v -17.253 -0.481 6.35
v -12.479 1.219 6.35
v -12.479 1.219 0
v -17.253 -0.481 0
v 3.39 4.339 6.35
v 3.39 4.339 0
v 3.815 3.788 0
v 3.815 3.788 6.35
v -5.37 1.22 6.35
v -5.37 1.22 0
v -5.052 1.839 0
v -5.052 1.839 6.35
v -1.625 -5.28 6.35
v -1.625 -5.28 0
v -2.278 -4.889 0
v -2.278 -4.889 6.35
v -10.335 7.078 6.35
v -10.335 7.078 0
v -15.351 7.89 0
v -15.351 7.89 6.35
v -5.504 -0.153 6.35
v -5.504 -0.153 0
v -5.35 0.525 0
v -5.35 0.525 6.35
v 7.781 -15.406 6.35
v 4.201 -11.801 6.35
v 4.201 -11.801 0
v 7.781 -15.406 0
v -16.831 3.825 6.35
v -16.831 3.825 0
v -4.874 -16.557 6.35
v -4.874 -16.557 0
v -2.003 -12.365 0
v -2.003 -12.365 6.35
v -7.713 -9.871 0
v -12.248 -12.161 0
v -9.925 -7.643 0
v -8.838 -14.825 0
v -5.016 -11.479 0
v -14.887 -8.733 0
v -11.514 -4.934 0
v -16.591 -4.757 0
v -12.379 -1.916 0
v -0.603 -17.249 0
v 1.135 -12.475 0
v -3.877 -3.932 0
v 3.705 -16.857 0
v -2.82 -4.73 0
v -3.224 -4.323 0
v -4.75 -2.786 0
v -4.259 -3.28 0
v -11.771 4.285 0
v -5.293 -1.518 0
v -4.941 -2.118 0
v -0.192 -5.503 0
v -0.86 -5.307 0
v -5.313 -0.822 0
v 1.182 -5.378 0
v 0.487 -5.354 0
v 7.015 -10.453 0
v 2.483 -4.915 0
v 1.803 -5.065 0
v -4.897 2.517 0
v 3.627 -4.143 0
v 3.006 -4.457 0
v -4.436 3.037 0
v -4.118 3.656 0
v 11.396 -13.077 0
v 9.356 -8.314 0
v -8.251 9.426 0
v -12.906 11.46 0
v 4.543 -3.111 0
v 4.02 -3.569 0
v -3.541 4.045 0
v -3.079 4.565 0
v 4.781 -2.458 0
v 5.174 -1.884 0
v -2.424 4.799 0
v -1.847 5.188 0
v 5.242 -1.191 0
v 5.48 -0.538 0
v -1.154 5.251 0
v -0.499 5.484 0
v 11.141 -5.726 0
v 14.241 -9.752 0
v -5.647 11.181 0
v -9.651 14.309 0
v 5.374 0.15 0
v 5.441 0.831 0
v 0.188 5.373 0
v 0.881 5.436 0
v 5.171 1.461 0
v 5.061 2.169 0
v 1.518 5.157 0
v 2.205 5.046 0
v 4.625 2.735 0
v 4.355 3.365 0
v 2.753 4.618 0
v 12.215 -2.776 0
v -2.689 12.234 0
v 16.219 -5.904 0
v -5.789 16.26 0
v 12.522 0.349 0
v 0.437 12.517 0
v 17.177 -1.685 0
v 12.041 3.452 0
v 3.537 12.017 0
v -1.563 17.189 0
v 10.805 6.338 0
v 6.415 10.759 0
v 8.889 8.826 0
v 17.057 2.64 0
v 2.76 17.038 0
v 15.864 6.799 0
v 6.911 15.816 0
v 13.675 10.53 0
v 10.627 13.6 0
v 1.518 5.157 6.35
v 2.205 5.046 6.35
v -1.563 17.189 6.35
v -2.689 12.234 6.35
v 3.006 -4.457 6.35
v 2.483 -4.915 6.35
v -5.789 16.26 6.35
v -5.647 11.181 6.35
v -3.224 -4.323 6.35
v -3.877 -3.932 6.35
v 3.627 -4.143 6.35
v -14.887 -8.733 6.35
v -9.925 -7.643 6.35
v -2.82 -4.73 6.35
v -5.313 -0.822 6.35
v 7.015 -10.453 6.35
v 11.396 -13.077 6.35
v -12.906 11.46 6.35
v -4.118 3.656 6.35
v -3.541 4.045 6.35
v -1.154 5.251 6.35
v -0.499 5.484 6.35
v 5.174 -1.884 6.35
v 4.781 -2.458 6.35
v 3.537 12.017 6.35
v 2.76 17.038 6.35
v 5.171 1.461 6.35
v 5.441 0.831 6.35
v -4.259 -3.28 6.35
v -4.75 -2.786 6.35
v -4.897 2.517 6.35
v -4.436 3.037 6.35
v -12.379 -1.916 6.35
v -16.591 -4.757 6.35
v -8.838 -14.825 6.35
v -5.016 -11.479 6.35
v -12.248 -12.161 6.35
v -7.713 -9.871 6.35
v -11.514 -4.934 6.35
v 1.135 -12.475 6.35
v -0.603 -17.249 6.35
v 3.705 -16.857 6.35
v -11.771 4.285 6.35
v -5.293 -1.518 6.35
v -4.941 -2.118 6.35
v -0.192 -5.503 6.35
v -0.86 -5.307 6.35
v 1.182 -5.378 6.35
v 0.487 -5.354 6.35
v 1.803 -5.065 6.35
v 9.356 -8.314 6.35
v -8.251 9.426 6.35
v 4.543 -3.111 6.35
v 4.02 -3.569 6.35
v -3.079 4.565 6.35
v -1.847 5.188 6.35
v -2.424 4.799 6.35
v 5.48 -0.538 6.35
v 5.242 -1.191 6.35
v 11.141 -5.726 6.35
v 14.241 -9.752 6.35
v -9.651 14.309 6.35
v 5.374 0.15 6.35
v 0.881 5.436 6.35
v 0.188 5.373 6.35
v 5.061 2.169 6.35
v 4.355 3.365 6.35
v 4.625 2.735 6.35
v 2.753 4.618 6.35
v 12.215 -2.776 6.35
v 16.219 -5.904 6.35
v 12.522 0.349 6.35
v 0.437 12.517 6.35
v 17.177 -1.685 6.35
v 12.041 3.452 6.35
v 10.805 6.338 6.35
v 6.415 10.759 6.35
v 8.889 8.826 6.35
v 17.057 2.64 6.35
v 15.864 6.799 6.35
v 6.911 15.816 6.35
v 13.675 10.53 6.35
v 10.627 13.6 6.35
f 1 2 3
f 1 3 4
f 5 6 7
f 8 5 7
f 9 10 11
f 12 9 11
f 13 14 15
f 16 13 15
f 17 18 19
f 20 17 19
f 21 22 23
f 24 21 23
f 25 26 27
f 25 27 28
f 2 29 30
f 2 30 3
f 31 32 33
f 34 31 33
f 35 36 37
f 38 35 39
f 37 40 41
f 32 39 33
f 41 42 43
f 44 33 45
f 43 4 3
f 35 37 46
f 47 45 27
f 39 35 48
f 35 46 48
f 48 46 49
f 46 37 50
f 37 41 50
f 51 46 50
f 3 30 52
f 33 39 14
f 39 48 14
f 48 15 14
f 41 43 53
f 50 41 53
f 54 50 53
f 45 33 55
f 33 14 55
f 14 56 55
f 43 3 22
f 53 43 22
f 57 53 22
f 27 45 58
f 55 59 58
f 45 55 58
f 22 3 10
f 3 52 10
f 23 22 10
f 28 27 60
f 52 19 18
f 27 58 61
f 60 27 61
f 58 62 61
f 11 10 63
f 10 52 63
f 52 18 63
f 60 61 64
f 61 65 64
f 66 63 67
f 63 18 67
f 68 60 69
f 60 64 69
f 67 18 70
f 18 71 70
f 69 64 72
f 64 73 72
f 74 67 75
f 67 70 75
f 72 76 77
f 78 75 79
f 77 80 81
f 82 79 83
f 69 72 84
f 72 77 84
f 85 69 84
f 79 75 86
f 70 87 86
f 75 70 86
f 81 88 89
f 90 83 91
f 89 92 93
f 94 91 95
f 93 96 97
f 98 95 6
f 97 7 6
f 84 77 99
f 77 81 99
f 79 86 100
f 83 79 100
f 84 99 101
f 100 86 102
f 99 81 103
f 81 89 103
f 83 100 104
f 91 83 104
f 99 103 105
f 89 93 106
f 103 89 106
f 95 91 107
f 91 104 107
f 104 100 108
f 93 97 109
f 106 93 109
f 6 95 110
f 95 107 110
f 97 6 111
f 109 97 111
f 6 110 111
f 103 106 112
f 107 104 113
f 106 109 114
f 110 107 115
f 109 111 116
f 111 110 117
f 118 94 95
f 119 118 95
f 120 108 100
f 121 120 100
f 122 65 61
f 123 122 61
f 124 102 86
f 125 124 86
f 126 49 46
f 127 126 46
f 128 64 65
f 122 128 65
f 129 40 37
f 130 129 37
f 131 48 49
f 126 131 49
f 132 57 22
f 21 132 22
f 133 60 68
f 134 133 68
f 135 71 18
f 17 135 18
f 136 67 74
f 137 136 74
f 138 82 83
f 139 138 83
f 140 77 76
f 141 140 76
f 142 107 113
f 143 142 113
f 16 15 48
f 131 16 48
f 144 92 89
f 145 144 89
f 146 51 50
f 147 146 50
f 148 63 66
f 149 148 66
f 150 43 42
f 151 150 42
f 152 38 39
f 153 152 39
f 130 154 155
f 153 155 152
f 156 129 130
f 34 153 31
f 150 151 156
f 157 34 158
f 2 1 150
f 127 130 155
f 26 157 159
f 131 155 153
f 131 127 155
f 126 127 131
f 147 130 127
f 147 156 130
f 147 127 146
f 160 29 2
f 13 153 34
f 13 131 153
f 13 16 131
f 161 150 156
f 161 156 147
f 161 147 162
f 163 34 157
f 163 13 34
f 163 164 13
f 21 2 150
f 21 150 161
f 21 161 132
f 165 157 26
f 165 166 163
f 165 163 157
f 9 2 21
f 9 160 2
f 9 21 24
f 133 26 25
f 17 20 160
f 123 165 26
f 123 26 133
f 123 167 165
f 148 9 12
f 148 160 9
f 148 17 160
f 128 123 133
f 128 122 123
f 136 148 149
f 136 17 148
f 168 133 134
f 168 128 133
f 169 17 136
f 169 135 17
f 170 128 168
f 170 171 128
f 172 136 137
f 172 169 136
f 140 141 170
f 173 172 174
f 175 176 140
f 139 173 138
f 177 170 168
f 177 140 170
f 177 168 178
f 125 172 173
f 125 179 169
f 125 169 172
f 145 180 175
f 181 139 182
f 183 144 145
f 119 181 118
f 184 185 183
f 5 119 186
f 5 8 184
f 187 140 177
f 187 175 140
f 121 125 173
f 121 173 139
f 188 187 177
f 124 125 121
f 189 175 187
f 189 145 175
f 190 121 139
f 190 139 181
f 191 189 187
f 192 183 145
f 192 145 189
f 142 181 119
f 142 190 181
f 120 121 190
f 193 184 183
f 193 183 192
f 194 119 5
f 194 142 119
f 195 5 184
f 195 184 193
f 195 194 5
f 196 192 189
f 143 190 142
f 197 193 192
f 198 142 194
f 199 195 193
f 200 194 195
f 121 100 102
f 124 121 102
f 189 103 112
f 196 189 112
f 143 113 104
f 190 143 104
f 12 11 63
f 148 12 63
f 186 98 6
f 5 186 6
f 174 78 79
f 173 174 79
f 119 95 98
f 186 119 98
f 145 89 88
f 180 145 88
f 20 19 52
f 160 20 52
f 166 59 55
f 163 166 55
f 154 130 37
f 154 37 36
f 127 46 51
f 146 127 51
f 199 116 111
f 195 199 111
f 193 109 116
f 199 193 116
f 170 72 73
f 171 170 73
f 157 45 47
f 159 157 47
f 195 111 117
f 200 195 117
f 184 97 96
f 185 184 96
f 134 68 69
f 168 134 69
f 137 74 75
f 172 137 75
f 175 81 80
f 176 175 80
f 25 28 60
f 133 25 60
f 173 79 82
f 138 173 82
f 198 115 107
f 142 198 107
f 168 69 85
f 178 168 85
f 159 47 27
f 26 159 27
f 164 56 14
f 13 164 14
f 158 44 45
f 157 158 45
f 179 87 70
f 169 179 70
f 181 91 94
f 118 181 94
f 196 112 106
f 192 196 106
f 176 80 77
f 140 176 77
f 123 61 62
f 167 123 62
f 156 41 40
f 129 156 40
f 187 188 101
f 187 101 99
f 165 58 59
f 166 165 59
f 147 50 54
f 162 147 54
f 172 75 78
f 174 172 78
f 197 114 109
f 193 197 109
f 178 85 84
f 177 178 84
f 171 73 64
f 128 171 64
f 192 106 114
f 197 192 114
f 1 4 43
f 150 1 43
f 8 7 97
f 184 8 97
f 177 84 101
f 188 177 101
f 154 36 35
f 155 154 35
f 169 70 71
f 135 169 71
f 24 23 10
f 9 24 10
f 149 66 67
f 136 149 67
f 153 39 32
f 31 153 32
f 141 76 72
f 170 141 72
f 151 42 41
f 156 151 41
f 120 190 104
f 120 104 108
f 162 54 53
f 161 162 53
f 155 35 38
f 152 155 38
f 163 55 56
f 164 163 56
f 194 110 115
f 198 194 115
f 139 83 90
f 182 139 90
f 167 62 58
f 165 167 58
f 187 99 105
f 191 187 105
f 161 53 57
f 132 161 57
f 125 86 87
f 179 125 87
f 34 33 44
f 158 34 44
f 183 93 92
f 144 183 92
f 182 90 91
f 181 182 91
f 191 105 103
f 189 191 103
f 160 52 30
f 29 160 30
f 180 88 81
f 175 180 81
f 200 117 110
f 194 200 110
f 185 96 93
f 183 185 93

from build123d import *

# Parameters (mm, degrees)
F1_DEPTH = 6.35


with BuildPart() as f1:
    # F0 (on Top) → F1 (new body)
    with BuildSketch(Plane.XY):
        Polygon((-9.9249884928, -7.6425344914), (-12.247526979, -12.1611884982), (-7.7125556882, -9.8706744851), (-7.0632786771, -7.0134863597), align=None)
        Polygon((-14.8871129928, -8.7332862962), (-9.9249884928, -7.6425344914), (-8.5855559204, -5.0365788116), (-11.5137977688, -4.9341859484), align=None)
        Polygon((-2.689317388, 12.2344310052), (-0.9016808431, 9.9129142155), (0.4368313525, 12.5170792408), (-1.5634892742, 17.1887150212), align=None)
        Polygon((2.7602902155, 17.0375239022), (0.4368313525, 12.5170792408), (1.59009399, 9.8236995246), (3.5373152954, 12.0167021489), align=None)
        Polygon((6.9106305194, 15.8158024967), (3.5373152954, 12.0167021489), (3.9854338983, 9.1211410048), (6.4146163322, 10.759480812), align=None)
        Polygon((6.5561399087, -7.4897213623), (7.0148097041, -10.4534600445), (11.3956434652, -13.0766071379), (9.3563779673, -8.3140178118), align=None)
        Polygon((4.4824223233, -8.9371220687), (4.2014921158, -11.8008980182), (7.7812835915, -15.4061042596), (7.0148097041, -10.4534600445), align=None)
        Polygon((2.136988413, -9.7217373504), (1.1347305184, -12.4750197068), (3.7054779287, -16.8572197029), (4.2014921158, -11.8008980182), align=None)
        Polygon((-16.8305841839, 3.8246383906), (-12.478542001, 1.2187310622), (-9.7063763642, 2.2057095149), (-11.770880067, 4.2848701827), align=None)
        Polygon((-15.3506715427, 7.8900764242), (-11.770880067, 4.2848701827), (-8.8528950516, 4.5502907373), (-10.3354723423, 7.0775519423), align=None)
        Polygon((-12.9062197526, 11.4597519383), (-10.3354723423, 7.0775519423), (-7.4431537842, 6.6089604578), (-8.2506488792, 9.4255250839), align=None)
        Polygon((9.1491069561, 3.9208083979), (12.0414255143, 3.4522169134), (15.8642946714, 6.7985717154), (10.8045905545, 6.3383399234), align=None)
        Polygon((9.8367363351, 1.5223386156), (12.5216534238, 0.3491784184), (17.0566247147, 2.6396924315), (12.0414255143, 3.4522169134), align=None)
        Polygon((9.9062873932, -0.9717853007), (12.2150997973, -2.7758002408), (17.1772242973, -1.685048436), (12.5216534238, 0.3491784184), align=None)
        Polygon((-5.0971896576, -8.549710766), (-7.7125556882, -9.8706744851), (-8.8383838019, -14.8249585011), (-5.0155146449, -11.4786036991), align=None)
        Polygon((-16.5912869462, -4.7566395974), (-11.5137977688, -4.9341859484), (-9.5683711098, -2.7432044935), (-12.3791527863, -1.9158043555), align=None)
        Polygon((10.6267504922, 13.600316054), (6.4146163322, 10.759480812), (6.128559691, 7.8434464811), (8.8888634336, 8.8262017251), align=None)
        Polygon((-0.3478467723, -9.9477585018), (-2.0033303707, -12.3652900273), (-0.6031565401, -17.2491340356), (1.1347305184, -12.4750197068), align=None)
        Polygon((-9.6508227097, 14.3093690922), (-8.2506488792, 9.4255250839), (-5.5657317905, 8.2523648867), (-5.6474068032, 11.1812578198), align=None)
        Polygon((9.3533899816, -3.4048483725), (11.1410265265, -5.7263651621), (16.2185157039, -5.9039115131), (12.2150997973, -2.7758002408), align=None)
        Polygon((-17.2529693223, -0.4811157391), (-12.3791527863, -1.9158043555), (-9.9639958973, -0.2869239484), (-12.478542001, 1.2187310622), align=None)
        Polygon((8.8888634336, 8.8262017251), (7.886605539, 6.0729193688), (10.8045905545, 6.3383399234), (13.6751526491, 10.5302717351), align=None)
        Polygon((-2.8108254657, -9.5487254013), (-5.0155146449, -11.4786036991), (-4.8738924653, -16.557221839), (-2.0033303707, -12.3652900273), align=None)
        Polygon((-5.7890289828, 16.2598759598), (-5.6474068032, 11.1812578198), (-3.3385943991, 9.3772428798), (-2.689317388, 12.2344310052), align=None)
        Polygon((8.2044177088, -5.6236797282), (9.3563779673, -8.3140178118), (14.2407381212, -9.7518101167), (11.1410265265, -5.7263651621), align=None)
        Polygon((-11.5137977688, -4.9341859484), (-8.5855559204, -5.0365788116), (-7.6908568489, -3.2958819112), (-9.5683711098, -2.7432044935), align=None)
        Polygon((0.4368313525, 12.5170792408), (-0.9016808431, 9.9129142155), (0.2924044657, 8.3622135988), (1.59009399, 9.8236995246), align=None)
        Polygon((6.4146163322, 10.759480812), (3.9854338983, 9.1211410048), (4.2847631114, 7.1869967109), (6.128559691, 7.8434464811), align=None)
        Polygon((6.2568106956, -5.5555770683), (6.5561399087, -7.4897213623), (9.3563779673, -8.3140178118), (8.2044177088, -5.6236797282), align=None)
        Polygon((2.7912330824, -7.9244750742), (2.136988413, -9.7217373504), (4.2014921158, -11.8008980182), (4.4824223233, -8.9371220687), align=None)
        Polygon((0.7579645009, -8.3329230441), (-0.3478467723, -9.9477585018), (1.1347305184, -12.4750197068), (2.136988413, -9.7217373504), align=None)
        Polygon((-12.478542001, 1.2187310622), (-9.9639958973, -0.2869239484), (-8.3273524521, 0.8168952086), (-9.7063763642, 2.2057095149), align=None)
        Polygon((-10.3354723423, 7.0775519423), (-8.8528950516, 4.5502907373), (-6.9037723127, 4.7275833675), (-7.4431537842, 6.6089604578), align=None)
        Polygon((-8.2506488792, 9.4255250839), (-7.4431537842, 6.6089604578), (-5.5111754362, 6.2959560001), (-5.5657317905, 8.2523648867), align=None)
        Polygon((8.0432956829, 2.3059729401), (9.8367363351, 1.5223386156), (12.0414255143, 3.4522169134), (9.1491069561, 3.9208083979), align=None)
        Polygon((8.3640729087, 0.233240264), (9.9062873932, -0.9717853007), (12.5216534238, 0.3491784184), (9.8367363351, 1.5223386156), align=None)
        Polygon((-3.3502069371, -7.667348311), (-5.0971896576, -8.549710766), (-5.0155146449, -11.4786036991), (-2.8108254657, -9.5487254013), align=None)
        Polygon((-7.0632786771, -7.0134863597), (-7.7125556882, -9.8706744851), (-5.0971896576, -8.549710766), (-5.1517460119, -6.5933018793), align=None)
        Polygon((-12.3791527863, -1.9158043555), (-9.5683711098, -2.7432044935), (-8.2817684408, -1.2942048232), (-9.9639958973, -0.2869239484), align=None)
        Polygon((8.8888634336, 8.8262017251), (6.128559691, 7.8434464811), (5.9374828002, 5.8956267385), (7.886605539, 6.0729193688), align=None)
        Polygon((7.4349186173, -3.8265580864), (8.2044177088, -5.6236797282), (11.1410265265, -5.7263651621), (9.3533899816, -3.4048483725), align=None)
        Polygon((-2.0660911099, -7.0187697185), (-3.3502069371, -7.667348311), (-2.8108254657, -9.5487254013), (-1.3381620393, -8.2596270497), align=None)
        Polygon((-6.6295819379, -5.1049740422), (-7.0632786771, -7.0134863597), (-5.1517460119, -6.5933018793), (-5.1918475408, -5.1552478068), align=None)
        Polygon((-9.5683711098, -2.7432044935), (-7.6908568489, -3.2958819112), (-7.0432040229, -2.0358300091), (-8.2817684408, -1.2942048232), align=None)
        Polygon((-9.7063763642, 2.2057095149), (-8.3273524521, 0.8168952086), (-7.134650714, 1.621301954), (-7.8625797846, 2.8621592851), align=None)
        Polygon((-7.4431537842, 6.6089604578), (-6.9037723127, 4.7275833675), (-5.4710739073, 4.8579019275), (-5.5111754362, 6.2959560001), align=None)
        Polygon((-3.7722911382, 7.4687305622), (-2.4540265099, 6.8927218662), (-1.7963799146, 8.1722173151), (-3.3385943991, 9.3772428798), align=None)
        Polygon((1.59009399, 9.8236995246), (0.2924044657, 8.3622135988), (1.1701142599, 7.2223745025), (2.3602476918, 8.0250490774), align=None)
        Polygon((6.128559691, 7.8434464811), (4.2847631114, 7.1869967109), (4.5047843947, 5.7653081785), (5.9374828002, 5.8956267385), align=None)
        Polygon((7.2171286082, 4.2338128556), (6.7250310546, 2.8819816361), (8.0432956829, 2.3059729401), (9.1491069561, 3.9208083979), align=None)
        Polygon((7.2815948785, -0.7143086595), (8.1593046728, -1.8541477557), (9.9062873932, -0.9717853007), (8.3640729087, 0.233240264), align=None)
        Polygon((6.0367894123, -4.133888536), (6.2568106956, -5.5555770683), (8.2044177088, -5.6236797282), (7.4349186173, -3.8265580864), align=None)
        Polygon((3.2985628975, -6.5307996178), (2.7912330824, -7.9244750742), (4.4824223233, -8.9371220687), (4.6786256479, -6.9370439447), align=None)
        Polygon((-0.2556840091, -7.3120781262), (-1.3381620393, -8.2596270497), (-0.3478467723, -9.9477585018), (0.7579645009, -8.3329230441), align=None)
        Polygon((1.5475949938, -7.1798118856), (0.7579645009, -8.3329230441), (2.136988413, -9.7217373504), (2.7912330824, -7.9244750742), align=None)
        Polygon((4.8190762985, -5.5053033037), (4.6786256479, -6.9370439447), (6.5561399087, -7.4897213623), (6.2568106956, -5.5555770683), align=None)
        Polygon((6.8693397476, -2.5056805986), (7.4349186173, -3.8265580864), (9.3533899816, -3.4048483725), (8.1593046728, -1.8541477557), align=None)
        Polygon((7.2304715254, 1.1189916693), (8.3640729087, 0.233240264), (9.8367363351, 1.5223386156), (8.0432956829, 2.3059729401), align=None)
        Polygon((5.9374828002, 5.8956267385), (5.7970321496, 4.4638860976), (7.2171286082, 4.2338128556), (7.886605539, 6.0729193688), align=None)
        Polygon((3.9854338983, 9.1211410048), (2.3602476918, 8.0250490774), (2.9261977991, 6.7033045851), (4.2847631114, 7.1869967109), align=None)
        Polygon((-0.9016808431, 9.9129142155), (-1.7963799146, 8.1722173151), (-0.6627785313, 7.2864659098), (0.2924044657, 8.3622135988), align=None)
        Polygon((-5.5657317905, 8.2523648867), (-5.5111754362, 6.2959560001), (-4.0910789776, 6.0658827581), (-3.7722911382, 7.4687305622), align=None)
        Polygon((-8.8528950516, 4.5502907373), (-7.8625797846, 2.8621592851), (-6.5073011421, 3.3446812528), (-6.9037723127, 4.7275833675), align=None)
        Polygon((-9.9639958973, -0.2869239484), (-8.2817684408, -1.2942048232), (-7.3137039421, -0.2039497093), (-8.3273524521, 0.8168952086), align=None)
        Polygon((-7.6908568489, -3.2958819112), (-8.5855559204, -5.0365788116), (-6.6295819379, -5.1049740422), (-6.3107940985, -3.702126238), align=None)
        Polygon((-5.1517460119, -6.5933018793), (-5.0971896576, -8.549710766), (-3.3502069371, -7.667348311), (-3.7466781078, -6.2844461962), align=None)
        Polygon((-6.3107940985, -3.702126238), (-6.6295819379, -5.1049740422), (-5.1918475408, -5.1552478068), (-5.2234435106, -4.022205892), align=None)
        Polygon((-8.2817684408, -1.2942048232), (-7.0432040229, -2.0358300091), (-6.5150509077, -1.008272789), (-7.3137039421, -0.2039497093), align=None)
        Polygon((-7.8625797846, 2.8621592851), (-7.134650714, 1.621301954), (-6.1949217518, 2.2550935314), (-6.5073011421, 3.3446812528), align=None)
        Polygon((-5.5111754362, 6.2959560001), (-5.4710739073, 4.8579019275), (-4.3422517192, 4.9605798404), (-4.0910789776, 6.0658827581), align=None)
        Polygon((-1.7963799146, 8.1722173151), (-2.4540265099, 6.8927218662), (-1.4153666242, 6.4388849707), (-0.6627785313, 7.2864659098), align=None)
        Polygon((2.3602476918, 8.0250490774), (1.1701142599, 7.2223745025), (1.8616612642, 6.3242959832), (2.9261977991, 6.7033045851), align=None)
        Polygon((4.5047843947, 5.7653081785), (4.6781390279, 4.6451606627), (5.7970321496, 4.4638860976), (5.9374828002, 5.8956267385), align=None)
        Polygon((6.7250310546, 2.8819816361), (6.3373076963, 1.816874654), (7.2304715254, 1.1189916693), (8.0432956829, 2.3059729401), align=None)
        Polygon((6.4238103153, -1.4651717873), (6.8693397476, -2.5056805986), (8.1593046728, -1.8541477557), (7.2815948785, -0.7143086595), align=None)
        Polygon((4.9297372792, -4.3772357378), (4.8190762985, -5.5053033037), (6.2568106956, -5.5555770683), (6.0367894123, -4.133888536), align=None)
        Polygon((2.2112123096, -6.2107199638), (1.5475949938, -7.1798118856), (2.7912330824, -7.9244750742), (3.2985628975, -6.5307996178), align=None)
        Polygon((-1.0543370435, -6.5077550465), (-2.0660911099, -7.0187697185), (-1.3381620393, -8.2596270497), (-0.2556840091, -7.3120781262), align=None)
        Polygon((-5.1918475408, -5.1552478068), (-5.1517460119, -6.5933018793), (-3.7466781078, -6.2844461962), (-4.059057498, -5.1948584749), align=None)
        Polygon((-3.7466781078, -6.2844461962), (-3.3502069371, -7.667348311), (-2.0660911099, -7.0187697185), (-2.6396259747, -6.0410989944), align=None)
        Polygon((0.5665164592, -6.5923635945), (-0.2556840091, -7.3120781262), (0.7579645009, -8.3329230441), (1.5475949938, -7.1798118856), align=None)
        Polygon((3.6862862557, -5.4656926356), (3.2985628975, -6.5307996178), (4.6786256479, -6.9370439447), (4.8190762985, -5.5053033037), align=None)
        Polygon((5.8634347792, -3.0137410202), (6.0367894123, -4.133888536), (7.4349186173, -3.8265580864), (6.8693397476, -2.5056805986), align=None)
        Polygon((4.2847631114, 7.1869967109), (2.9261977991, 6.7033045851), (3.3719542022, 5.6622656967), (4.5047843947, 5.7653081785), align=None)
        Polygon((0.2924044657, 8.3622135988), (-0.6627785313, 7.2864659098), (0.2303852978, 6.5885829251), (1.1701142599, 7.2223745025), align=None)
        Polygon((-4.0910789776, 6.0658827581), (-2.9721858559, 5.884608193), (-2.4540265099, 6.8927218662), (-3.7722911382, 7.4687305622), align=None)
        Polygon((-6.9037723127, 4.7275833675), (-6.5073011421, 3.3446812528), (-5.4394779374, 3.7248600128), (-5.4710739073, 4.8579019275), align=None)
        Polygon((-8.3273524521, 0.8168952086), (-7.3137039421, -0.2039497093), (-6.5611158492, 0.6436312299), (-7.134650714, 1.621301954), align=None)
        Polygon((-7.0432040229, -2.0358300091), (-7.6908568489, -3.2958819112), (-6.3107940985, -3.702126238), (-6.0652129672, -2.6214295857), align=None)
        Polygon((-8.5855559204, -5.0365788116), (-9.9249884928, -7.6425344914), (-7.0632786771, -7.0134863597), (-6.6295819379, -5.1049740422), align=None)
        Polygon((-1.3381620393, -8.2596270497), (-2.8108254657, -9.5487254013), (-2.0033303707, -12.3652900273), (-0.3478467723, -9.9477585018), align=None)
        Polygon((4.6786256479, -6.9370439447), (4.4824223233, -8.9371220687), (7.0148097041, -10.4534600445), (6.5561399087, -7.4897213623), align=None)
        Polygon((8.1593046728, -1.8541477557), (9.3533899816, -3.4048483725), (12.2150997973, -2.7758002408), (9.9062873932, -0.9717853007), align=None)
        Polygon((7.886605539, 6.0729193688), (7.2171286082, 4.2338128556), (9.1491069561, 3.9208083979), (10.8045905545, 6.3383399234), align=None)
        Polygon((3.5373152954, 12.0167021489), (1.59009399, 9.8236995246), (2.3602476918, 8.0250490774), (3.9854338983, 9.1211410048), align=None)
        Polygon((-5.6474068032, 11.1812578198), (-5.5657317905, 8.2523648867), (-3.7722911382, 7.4687305622), (-3.3385943991, 9.3772428798), align=None)
        Polygon((-11.770880067, 4.2848701827), (-9.7063763642, 2.2057095149), (-7.8625797846, 2.8621592851), (-8.8528950516, 4.5502907373), align=None)
        Polygon((-3.3385943991, 9.3772428798), (-1.7963799146, 8.1722173151), (-0.9016808431, 9.9129142155), (-2.689317388, 12.2344310052), align=None)
        Polygon((-6.0652129672, -2.6214295857), (-6.3107940985, -3.702126238), (-5.2234435106, -4.022205892), (-5.2488747006, -3.1102350205), align=None)
        Polygon((-5.2725969431, -2.2595475681), (-5.2488747006, -3.1102350205), (-4.5339861367, -3.5382946001), (-4.7495879513, -2.7862696675), align=None)
        Polygon((-5.8506796099, -1.6773607975), (-6.0652129672, -2.6214295857), (-5.2488747006, -3.1102350205), (-5.2725969431, -2.2595475681), align=None)
        Polygon((-5.2932880012, -1.5175593906), (-5.2725969431, -2.2595475681), (-4.7495879513, -2.7862696675), (-4.9413002859, -2.1175718843), align=None)
        Polygon((-6.5150509077, -1.008272789), (-7.0432040229, -2.0358300091), (-6.0652129672, -2.6214295857), (-5.8506796099, -1.6773607975), align=None)
        Polygon((-5.6688752442, -0.8773181874), (-5.8506796099, -1.6773607975), (-5.2725969431, -2.2595475681), (-5.2932880012, -1.5175593906), align=None)
        Polygon((-5.2234435106, -4.022205892), (-5.1918475408, -5.1552478068), (-4.059057498, -5.1948584749), (-4.3189148979, -4.2884688698), align=None)
        Polygon((-4.059057498, -5.1948584749), (-3.7466781078, -6.2844461962), (-2.6396259747, -6.0410989944), (-3.1167294051, -5.2278091929), align=None)
        Polygon((-2.6396259747, -6.0410989944), (-2.0660911099, -7.0187697185), (-1.0543370435, -6.5077550465), (-1.7187083413, -5.8386670379), align=None)
        Polygon((-0.2517659208, -6.1023940673), (-1.0543370435, -6.5077550465), (-0.2556840091, -7.3120781262), (0.5665164592, -6.5923635945), align=None)
        Polygon((2.7439581628, -5.4327419176), (2.2112123096, -6.2107199638), (3.2985628975, -6.5307996178), (3.6862862557, -5.4656926356), align=None)
        Polygon((4.0088196458, -4.5796676942), (3.6862862557, -5.4656926356), (4.8190762985, -5.5053033037), (4.9297372792, -4.3772357378), align=None)
        Polygon((5.7192271726, -2.0819297997), (5.8634347792, -3.0137410202), (6.8693397476, -2.5056805986), (6.4238103153, -1.4651717873), align=None)
        Polygon((6.5900478743, 0.1837698598), (7.2815948785, -0.7143086595), (8.3640729087, 0.233240264), (7.2304715254, 1.1189916693), align=None)
        Polygon((3.3719542022, 5.6622656967), (3.7425603354, 4.7967360164), (4.6781390279, 4.6451606627), (4.5047843947, 5.7653081785), align=None)
        Polygon((2.9261977991, 6.7033045851), (1.8616612642, 6.3242959832), (2.4369348322, 5.5772161305), (3.3719542022, 5.6622656967), align=None)
        Polygon((1.8616612642, 6.3242959832), (0.9733767931, 6.0080386784), (1.6198684559, 5.5028955943), (2.4369348322, 5.5772161305), align=None)
        Polygon((-0.5513420898, 6.0613540601), (-1.2315386221, 5.6026017491), (-0.4988159775, 5.4838915915), (0.2004628252, 5.7328569136), align=None)
        Polygon((-4.3189148979, -4.2884688698), (-4.059057498, -5.1948584749), (-3.1167294051, -5.2278091929), (-3.5318665797, -4.5201495772), align=None)
        Polygon((-3.1167294051, -5.2278091929), (-2.6396259747, -6.0410989944), (-1.7187083413, -5.8386670379), (-2.2967910081, -5.2564802674), align=None)
        Polygon((-1.7187083413, -5.8386670379), (-1.0543370435, -6.5077550465), (-0.2517659208, -6.1023940673), (-0.9678523113, -5.6736172554), align=None)
        Polygon((1.3066836969, -5.944456986), (0.5665164592, -6.5923635945), (1.5475949938, -7.1798118856), (2.2112123096, -6.2107199638), align=None)
        Polygon((1.9240197658, -5.4040708431), (1.3066836969, -5.944456986), (2.2112123096, -6.2107199638), (2.7439581628, -5.4327419176), align=None)
        Polygon((3.207510915, -4.7558077617), (2.7439581628, -5.4327419176), (3.6862862557, -5.4656926356), (4.0088196458, -4.5796676942), align=None)
        Polygon((5.0217922471, -3.4388361068), (4.9297372792, -4.3772357378), (6.0367894123, -4.133888536), (5.8634347792, -3.0137410202), align=None)
        Polygon((4.2894623571, -3.808719788), (4.0088196458, -4.5796676942), (4.9297372792, -4.3772357378), (5.0217922471, -3.4388361068), align=None)
        Polygon((5.1018911037, -2.6223159426), (5.0217922471, -3.4388361068), (5.8634347792, -3.0137410202), (5.7192271726, -2.0819297997), align=None)
        Polygon((5.5937492688, -1.2711423422), (5.7192271726, -2.0819297997), (6.4238103153, -1.4651717873), (6.0533491398, -0.5999806477), align=None)
        Polygon((6.0533491398, -0.5999806477), (6.4238103153, -1.4651717873), (7.2815948785, -0.7143086595), (6.5900478743, 0.1837698598), align=None)
        Polygon((6.0147743062, 0.9308497126), (5.7313046688, 0.1521360147), (6.0533491398, -0.5999806477), (6.5900478743, 0.1837698598), align=None)
        Polygon((6.3373076963, 1.816874654), (6.0147743062, 0.9308497126), (6.5900478743, 0.1837698598), (7.2304715254, 1.1189916693), align=None)
        Polygon((5.6863711689, 3.3358185317), (5.594316201, 2.3974189007), (6.3373076963, 1.816874654), (6.7250310546, 2.8819816361), align=None)
        Polygon((4.8223466344, 3.7133494422), (4.9478245382, 2.9025619848), (5.594316201, 2.3974189007), (5.6863711689, 3.3358185317), align=None)
        Polygon((0.5196353786, -5.7127762786), (-0.2517659208, -6.1023940673), (0.5665164592, -6.5923635945), (1.3066836969, -5.944456986), align=None)
        Polygon((-0.9678523113, -5.6736172554), (-0.2517659208, -6.1023940673), (0.5196353786, -5.7127762786), (-0.1924312012, -5.5031676878), align=None)
        Polygon((1.1821965302, -5.378131249), (0.5196353786, -5.7127762786), (1.3066836969, -5.944456986), (1.9240197658, -5.4040708431), align=None)
        Polygon((-5.2488747006, -3.1102350205), (-5.2234435106, -4.022205892), (-4.3189148979, -4.2884688698), (-4.5339861367, -3.5382946001), align=None)
        Polygon((-3.5318665797, -4.5201495772), (-3.1167294051, -5.2278091929), (-2.2967910081, -5.2564802674), (-2.8197999999, -4.729758168), align=None)
        Polygon((-2.2967910081, -5.2564802674), (-1.7187083413, -5.8386670379), (-0.9678523113, -5.6736172554), (-1.6252848904, -5.2799610581), align=None)
        Polygon((-0.1924312012, -5.5031676878), (0.5196353786, -5.7127762786), (1.1821965302, -5.378131249), (0.4869847767, -5.3538215349), align=None)
        Polygon((2.4825425057, -4.9151670444), (1.9240197658, -5.4040708431), (2.7439581628, -5.4327419176), (3.207510915, -4.7558077617), align=None)
        Polygon((3.6269012055, -4.1433648177), (3.207510915, -4.7558077617), (4.0088196458, -4.5796676942), (4.2894623571, -3.808719788), align=None)
        Polygon((4.5433683637, -3.1112197413), (4.2894623571, -3.808719788), (5.0217922471, -3.4388361068), (5.1018911037, -2.6223159426), align=None)
        Polygon((5.7313046688, 0.1521360147), (5.4802255883, -0.5375982404), (5.5937492688, -1.2711423422), (6.0533491398, -0.5999806477), align=None)
        Polygon((5.594316201, 2.3974189007), (5.5142173444, 1.5808987365), (6.0147743062, 0.9308497126), (6.3373076963, 1.816874654), align=None)
        Polygon((5.7970321496, 4.4638860976), (5.6863711689, 3.3358185317), (6.7250310546, 2.8819816361), (7.2171286082, 4.2338128556), align=None)
        Polygon((4.6781390279, 4.6451606627), (4.8223466344, 3.7133494422), (5.6863711689, 3.3358185317), (5.7970321496, 4.4638860976), align=None)
        Polygon((4.9478245382, 2.9025619848), (5.0613482187, 2.1690178829), (5.5142173444, 1.5808987365), (5.594316201, 2.3974189007), align=None)
        Polygon((1.1701142599, 7.2223745025), (0.2303852978, 6.5885829251), (0.9733767931, 6.0080386784), (1.8616612642, 6.3242959832), align=None)
        Polygon((2.4369348322, 5.5772161305), (2.9374917941, 4.9271671066), (3.7425603354, 4.7967360164), (3.3719542022, 5.6622656967), align=None)
        Polygon((4.6781390279, 4.6451606627), (3.7425603354, 4.7967360164), (4.0646989138, 4.0443995715), (4.8223466344, 3.7133494422), align=None)
        Polygon((3.7425603354, 4.7967360164), (2.9374917941, 4.9271671066), (3.3903609198, 4.3390479602), (4.0646989138, 4.0443995715), align=None)
        Polygon((-0.6627785313, 7.2864659098), (-1.4153666242, 6.4388849707), (-0.5513420898, 6.0613540601), (0.2303852978, 6.5885829251), align=None)
        Polygon((-2.4540265099, 6.8927218662), (-2.9721858559, 5.884608193), (-2.0414181215, 5.7338122742), (-1.4153666242, 6.4388849707), align=None)
        Polygon((-4.3422517192, 4.9605798404), (-3.4032243448, 5.0459939756), (-2.9721858559, 5.884608193), (-4.0910789776, 6.0658827581), align=None)
        Polygon((-7.134650714, 1.621301954), (-6.5611158492, 0.6436312299), (-5.9350643519, 1.3487039263), (-6.1949217518, 2.2550935314), align=None)
        Polygon((-7.3137039421, -0.2039497093), (-6.5150509077, -1.008272789), (-6.0840124187, -0.1696585716), (-6.5611158492, 0.6436312299), align=None)
        Polygon((-6.5611158492, 0.6436312299), (-6.0840124187, -0.1696585716), (-5.7089572651, 0.5600363216), (-5.9350643519, 1.3487039263), align=None)
        Polygon((-6.1949217518, 2.2550935314), (-5.9350643519, 1.3487039263), (-5.390324505, 1.9622016888), (-5.4131943642, 2.7823223964), align=None)
        Polygon((-5.4394779374, 3.7248600128), (-5.4131943642, 2.7823223964), (-4.732997832, 3.2410747074), (-4.5511934663, 4.0411173176), align=None)
        Polygon((0.2303852978, 6.5885829251), (-0.5513420898, 6.0613540601), (0.2004628252, 5.7328569136), (0.9733767931, 6.0080386784), align=None)
        Polygon((0.9733767931, 6.0080386784), (0.2004628252, 5.7328569136), (0.8806436249, 5.4356555422), (1.6198684559, 5.5028955943), align=None)
        Polygon((0.8806436249, 5.4356555422), (1.5180861634, 5.1571284259), (2.2047691494, 5.0458772641), (1.6198684559, 5.5028955943), align=None)
        Polygon((-6.5073011421, 3.3446812528), (-6.1949217518, 2.2550935314), (-5.4131943642, 2.7823223964), (-5.4394779374, 3.7248600128), align=None)
        Polygon((-5.4710739073, 4.8579019275), (-5.4394779374, 3.7248600128), (-4.5511934663, 4.0411173176), (-4.3422517192, 4.9605798404), align=None)
        Polygon((-2.9721858559, 5.884608193), (-3.4032243448, 5.0459939756), (-2.5861579684, 5.1203145117), (-2.0414181215, 5.7338122742), align=None)
        Polygon((-1.4153666242, 6.4388849707), (-2.0414181215, 5.7338122742), (-1.2315386221, 5.6026017491), (-0.5513420898, 6.0613540601), align=None)
        Polygon((1.6198684559, 5.5028955943), (2.2047691494, 5.0458772641), (2.9374917941, 4.9271671066), (2.4369348322, 5.5772161305), align=None)
        Polygon((4.3554157408, 3.3654468512), (4.9478245382, 2.9025619848), (4.8223466344, 3.7133494422), (4.0646989138, 4.0443995715), align=None)
        Polygon((5.5142173444, 1.5808987365), (5.4406486734, 0.8309466663), (5.7313046688, 0.1521360147), (6.0147743062, 0.9308497126), align=None)
        Polygon((-6.0840124187, -0.1696585716), (-6.5150509077, -1.008272789), (-5.8506796099, -1.6773607975), (-5.6688752442, -0.8773181874), align=None)
        Polygon((-4.5511934663, 4.0411173176), (-3.7782794984, 4.3162990824), (-3.4032243448, 5.0459939756), (-4.3422517192, 4.9605798404), align=None)
        Polygon((-2.0414181215, 5.7338122742), (-2.5861579684, 5.1203145117), (-1.8469331374, 5.1875545639), (-1.2315386221, 5.6026017491), align=None)
        Polygon((-1.2315386221, 5.6026017491), (-1.8469331374, 5.1875545639), (-1.1541565212, 5.2505696763), (-0.4988159775, 5.4838915915), align=None)
        Polygon((0.2004628252, 5.7328569136), (-0.4988159775, 5.4838915915), (0.1878670086, 5.3726404298), (0.8806436249, 5.4356555422), align=None)
        Polygon((2.9374917941, 4.9271671066), (2.2047691494, 5.0458772641), (2.7529183813, 4.6175750764), (3.3903609198, 4.3390479602), align=None)
        Polygon((4.0646989138, 4.0443995715), (3.3903609198, 4.3390479602), (3.8147746128, 3.7878825027), (4.3554157408, 3.3654468512), align=None)
        Polygon((4.6251600313, 2.7354743045), (5.0613482187, 2.1690178829), (4.9478245382, 2.9025619848), (4.3554157408, 3.3654468512), align=None)
        Polygon((5.0613482187, 2.1690178829), (5.1709506859, 1.4608110748), (5.4406486734, 0.8309466663), (5.5142173444, 1.5808987365), align=None)
        Polygon((5.4406486734, 0.8309466663), (5.3738350182, 0.1498545878), (5.4802255883, -0.5375982404), (5.7313046688, 0.1521360147), align=None)
        Polygon((5.4802255883, -0.5375982404), (5.2422734299, -1.1912717939), (5.1743589783, -1.8835852863), (5.5937492688, -1.2711423422), align=None)
        Polygon((5.1743589783, -1.8835852863), (5.1018911037, -2.6223159426), (5.7192271726, -2.0819297997), (5.5937492688, -1.2711423422), align=None)
        Polygon((4.7813205222, -2.4575461877), (4.5433683637, -3.1112197413), (5.1018911037, -2.6223159426), (5.1743589783, -1.8835852863), align=None)
        Polygon((4.0199396616, -3.5694039163), (3.6269012055, -4.1433648177), (4.2894623571, -3.808719788), (4.5433683637, -3.1112197413), align=None)
        Polygon((3.0059712078, -4.4569828694), (2.4825425057, -4.9151670444), (3.207510915, -4.7558077617), (3.6269012055, -4.1433648177), align=None)
        Polygon((1.8031265278, -5.0645131973), (1.1821965302, -5.378131249), (1.9240197658, -5.4040708431), (2.4825425057, -4.9151670444), align=None)
        Polygon((-1.6252848904, -5.2799610581), (-0.9678523113, -5.6736172554), (-0.1924312012, -5.5031676878), (-0.859756019, -5.3067295756), align=None)
        Polygon((-2.8197999999, -4.729758168), (-2.2967910081, -5.2564802674), (-1.6252848904, -5.2799610581), (-2.2776176458, -4.8893585234), align=None)
        Polygon((-4.5339861367, -3.5382946001), (-4.3189148979, -4.2884688698), (-3.5318665797, -4.5201495772), (-3.8771245311, -3.9316089109), align=None)
        Polygon((-3.8771245311, -3.9316089109), (-3.5318665797, -4.5201495772), (-2.8197999999, -4.729758168), (-3.2240073528, -4.3226811408), align=None)
        Polygon((-4.7495879513, -2.7862696675), (-4.5339861367, -3.5382946001), (-3.8771245311, -3.9316089109), (-4.259441538, -3.2798958802), align=None)
        Polygon((-5.5043912985, -0.153495276), (-5.6688752442, -0.8773181874), (-5.2932880012, -1.5175593906), (-5.312678964, -0.8221930591), align=None)
        Polygon((-5.7089572651, 0.5600363216), (-6.0840124187, -0.1696585716), (-5.6688752442, -0.8773181874), (-5.5043912985, -0.153495276), align=None)
        Polygon((-5.3696334469, 1.2202135113), (-5.7089572651, 0.5600363216), (-5.5043912985, -0.153495276), (-5.3502424841, 0.5248471798), align=None)
        Polygon((-5.9350643519, 1.3487039263), (-5.7089572651, 0.5600363216), (-5.3696334469, 1.2202135113), (-5.390324505, 1.9622016888), align=None)
        Polygon((-5.4131943642, 2.7823223964), (-5.390324505, 1.9622016888), (-4.8974817776, 2.5172517961), (-4.732997832, 3.2410747074), align=None)
        Polygon((-4.732997832, 3.2410747074), (-4.1176033166, 3.6561218927), (-3.7782794984, 4.3162990824), (-4.5511934663, 4.0411173176), align=None)
        Polygon((-3.4032243448, 5.0459939756), (-3.7782794984, 4.3162990824), (-3.0790006958, 4.5652644045), (-2.5861579684, 5.1203145117), align=None)
        Polygon((-5.390324505, 1.9622016888), (-5.3696334469, 1.2202135113), (-5.0516305921, 1.8389093402), (-4.8974817776, 2.5172517961), align=None)
        Polygon((-4.8974817776, 2.5172517961), (-4.4356061714, 3.0374260637), (-4.1176033166, 3.6561218927), (-4.732997832, 3.2410747074), align=None)
        Polygon((-3.7782794984, 4.3162990824), (-4.1176033166, 3.6561218927), (-3.540876302, 4.0450901368), (-3.0790006958, 4.5652644045), align=None)
        Polygon((-2.5861579684, 5.1203145117), (-3.0790006958, 4.5652644045), (-2.423660152, 4.7985863197), (-1.8469331374, 5.1875545639), align=None)
    extrude(amount=F1_DEPTH)


solid = f1.part
